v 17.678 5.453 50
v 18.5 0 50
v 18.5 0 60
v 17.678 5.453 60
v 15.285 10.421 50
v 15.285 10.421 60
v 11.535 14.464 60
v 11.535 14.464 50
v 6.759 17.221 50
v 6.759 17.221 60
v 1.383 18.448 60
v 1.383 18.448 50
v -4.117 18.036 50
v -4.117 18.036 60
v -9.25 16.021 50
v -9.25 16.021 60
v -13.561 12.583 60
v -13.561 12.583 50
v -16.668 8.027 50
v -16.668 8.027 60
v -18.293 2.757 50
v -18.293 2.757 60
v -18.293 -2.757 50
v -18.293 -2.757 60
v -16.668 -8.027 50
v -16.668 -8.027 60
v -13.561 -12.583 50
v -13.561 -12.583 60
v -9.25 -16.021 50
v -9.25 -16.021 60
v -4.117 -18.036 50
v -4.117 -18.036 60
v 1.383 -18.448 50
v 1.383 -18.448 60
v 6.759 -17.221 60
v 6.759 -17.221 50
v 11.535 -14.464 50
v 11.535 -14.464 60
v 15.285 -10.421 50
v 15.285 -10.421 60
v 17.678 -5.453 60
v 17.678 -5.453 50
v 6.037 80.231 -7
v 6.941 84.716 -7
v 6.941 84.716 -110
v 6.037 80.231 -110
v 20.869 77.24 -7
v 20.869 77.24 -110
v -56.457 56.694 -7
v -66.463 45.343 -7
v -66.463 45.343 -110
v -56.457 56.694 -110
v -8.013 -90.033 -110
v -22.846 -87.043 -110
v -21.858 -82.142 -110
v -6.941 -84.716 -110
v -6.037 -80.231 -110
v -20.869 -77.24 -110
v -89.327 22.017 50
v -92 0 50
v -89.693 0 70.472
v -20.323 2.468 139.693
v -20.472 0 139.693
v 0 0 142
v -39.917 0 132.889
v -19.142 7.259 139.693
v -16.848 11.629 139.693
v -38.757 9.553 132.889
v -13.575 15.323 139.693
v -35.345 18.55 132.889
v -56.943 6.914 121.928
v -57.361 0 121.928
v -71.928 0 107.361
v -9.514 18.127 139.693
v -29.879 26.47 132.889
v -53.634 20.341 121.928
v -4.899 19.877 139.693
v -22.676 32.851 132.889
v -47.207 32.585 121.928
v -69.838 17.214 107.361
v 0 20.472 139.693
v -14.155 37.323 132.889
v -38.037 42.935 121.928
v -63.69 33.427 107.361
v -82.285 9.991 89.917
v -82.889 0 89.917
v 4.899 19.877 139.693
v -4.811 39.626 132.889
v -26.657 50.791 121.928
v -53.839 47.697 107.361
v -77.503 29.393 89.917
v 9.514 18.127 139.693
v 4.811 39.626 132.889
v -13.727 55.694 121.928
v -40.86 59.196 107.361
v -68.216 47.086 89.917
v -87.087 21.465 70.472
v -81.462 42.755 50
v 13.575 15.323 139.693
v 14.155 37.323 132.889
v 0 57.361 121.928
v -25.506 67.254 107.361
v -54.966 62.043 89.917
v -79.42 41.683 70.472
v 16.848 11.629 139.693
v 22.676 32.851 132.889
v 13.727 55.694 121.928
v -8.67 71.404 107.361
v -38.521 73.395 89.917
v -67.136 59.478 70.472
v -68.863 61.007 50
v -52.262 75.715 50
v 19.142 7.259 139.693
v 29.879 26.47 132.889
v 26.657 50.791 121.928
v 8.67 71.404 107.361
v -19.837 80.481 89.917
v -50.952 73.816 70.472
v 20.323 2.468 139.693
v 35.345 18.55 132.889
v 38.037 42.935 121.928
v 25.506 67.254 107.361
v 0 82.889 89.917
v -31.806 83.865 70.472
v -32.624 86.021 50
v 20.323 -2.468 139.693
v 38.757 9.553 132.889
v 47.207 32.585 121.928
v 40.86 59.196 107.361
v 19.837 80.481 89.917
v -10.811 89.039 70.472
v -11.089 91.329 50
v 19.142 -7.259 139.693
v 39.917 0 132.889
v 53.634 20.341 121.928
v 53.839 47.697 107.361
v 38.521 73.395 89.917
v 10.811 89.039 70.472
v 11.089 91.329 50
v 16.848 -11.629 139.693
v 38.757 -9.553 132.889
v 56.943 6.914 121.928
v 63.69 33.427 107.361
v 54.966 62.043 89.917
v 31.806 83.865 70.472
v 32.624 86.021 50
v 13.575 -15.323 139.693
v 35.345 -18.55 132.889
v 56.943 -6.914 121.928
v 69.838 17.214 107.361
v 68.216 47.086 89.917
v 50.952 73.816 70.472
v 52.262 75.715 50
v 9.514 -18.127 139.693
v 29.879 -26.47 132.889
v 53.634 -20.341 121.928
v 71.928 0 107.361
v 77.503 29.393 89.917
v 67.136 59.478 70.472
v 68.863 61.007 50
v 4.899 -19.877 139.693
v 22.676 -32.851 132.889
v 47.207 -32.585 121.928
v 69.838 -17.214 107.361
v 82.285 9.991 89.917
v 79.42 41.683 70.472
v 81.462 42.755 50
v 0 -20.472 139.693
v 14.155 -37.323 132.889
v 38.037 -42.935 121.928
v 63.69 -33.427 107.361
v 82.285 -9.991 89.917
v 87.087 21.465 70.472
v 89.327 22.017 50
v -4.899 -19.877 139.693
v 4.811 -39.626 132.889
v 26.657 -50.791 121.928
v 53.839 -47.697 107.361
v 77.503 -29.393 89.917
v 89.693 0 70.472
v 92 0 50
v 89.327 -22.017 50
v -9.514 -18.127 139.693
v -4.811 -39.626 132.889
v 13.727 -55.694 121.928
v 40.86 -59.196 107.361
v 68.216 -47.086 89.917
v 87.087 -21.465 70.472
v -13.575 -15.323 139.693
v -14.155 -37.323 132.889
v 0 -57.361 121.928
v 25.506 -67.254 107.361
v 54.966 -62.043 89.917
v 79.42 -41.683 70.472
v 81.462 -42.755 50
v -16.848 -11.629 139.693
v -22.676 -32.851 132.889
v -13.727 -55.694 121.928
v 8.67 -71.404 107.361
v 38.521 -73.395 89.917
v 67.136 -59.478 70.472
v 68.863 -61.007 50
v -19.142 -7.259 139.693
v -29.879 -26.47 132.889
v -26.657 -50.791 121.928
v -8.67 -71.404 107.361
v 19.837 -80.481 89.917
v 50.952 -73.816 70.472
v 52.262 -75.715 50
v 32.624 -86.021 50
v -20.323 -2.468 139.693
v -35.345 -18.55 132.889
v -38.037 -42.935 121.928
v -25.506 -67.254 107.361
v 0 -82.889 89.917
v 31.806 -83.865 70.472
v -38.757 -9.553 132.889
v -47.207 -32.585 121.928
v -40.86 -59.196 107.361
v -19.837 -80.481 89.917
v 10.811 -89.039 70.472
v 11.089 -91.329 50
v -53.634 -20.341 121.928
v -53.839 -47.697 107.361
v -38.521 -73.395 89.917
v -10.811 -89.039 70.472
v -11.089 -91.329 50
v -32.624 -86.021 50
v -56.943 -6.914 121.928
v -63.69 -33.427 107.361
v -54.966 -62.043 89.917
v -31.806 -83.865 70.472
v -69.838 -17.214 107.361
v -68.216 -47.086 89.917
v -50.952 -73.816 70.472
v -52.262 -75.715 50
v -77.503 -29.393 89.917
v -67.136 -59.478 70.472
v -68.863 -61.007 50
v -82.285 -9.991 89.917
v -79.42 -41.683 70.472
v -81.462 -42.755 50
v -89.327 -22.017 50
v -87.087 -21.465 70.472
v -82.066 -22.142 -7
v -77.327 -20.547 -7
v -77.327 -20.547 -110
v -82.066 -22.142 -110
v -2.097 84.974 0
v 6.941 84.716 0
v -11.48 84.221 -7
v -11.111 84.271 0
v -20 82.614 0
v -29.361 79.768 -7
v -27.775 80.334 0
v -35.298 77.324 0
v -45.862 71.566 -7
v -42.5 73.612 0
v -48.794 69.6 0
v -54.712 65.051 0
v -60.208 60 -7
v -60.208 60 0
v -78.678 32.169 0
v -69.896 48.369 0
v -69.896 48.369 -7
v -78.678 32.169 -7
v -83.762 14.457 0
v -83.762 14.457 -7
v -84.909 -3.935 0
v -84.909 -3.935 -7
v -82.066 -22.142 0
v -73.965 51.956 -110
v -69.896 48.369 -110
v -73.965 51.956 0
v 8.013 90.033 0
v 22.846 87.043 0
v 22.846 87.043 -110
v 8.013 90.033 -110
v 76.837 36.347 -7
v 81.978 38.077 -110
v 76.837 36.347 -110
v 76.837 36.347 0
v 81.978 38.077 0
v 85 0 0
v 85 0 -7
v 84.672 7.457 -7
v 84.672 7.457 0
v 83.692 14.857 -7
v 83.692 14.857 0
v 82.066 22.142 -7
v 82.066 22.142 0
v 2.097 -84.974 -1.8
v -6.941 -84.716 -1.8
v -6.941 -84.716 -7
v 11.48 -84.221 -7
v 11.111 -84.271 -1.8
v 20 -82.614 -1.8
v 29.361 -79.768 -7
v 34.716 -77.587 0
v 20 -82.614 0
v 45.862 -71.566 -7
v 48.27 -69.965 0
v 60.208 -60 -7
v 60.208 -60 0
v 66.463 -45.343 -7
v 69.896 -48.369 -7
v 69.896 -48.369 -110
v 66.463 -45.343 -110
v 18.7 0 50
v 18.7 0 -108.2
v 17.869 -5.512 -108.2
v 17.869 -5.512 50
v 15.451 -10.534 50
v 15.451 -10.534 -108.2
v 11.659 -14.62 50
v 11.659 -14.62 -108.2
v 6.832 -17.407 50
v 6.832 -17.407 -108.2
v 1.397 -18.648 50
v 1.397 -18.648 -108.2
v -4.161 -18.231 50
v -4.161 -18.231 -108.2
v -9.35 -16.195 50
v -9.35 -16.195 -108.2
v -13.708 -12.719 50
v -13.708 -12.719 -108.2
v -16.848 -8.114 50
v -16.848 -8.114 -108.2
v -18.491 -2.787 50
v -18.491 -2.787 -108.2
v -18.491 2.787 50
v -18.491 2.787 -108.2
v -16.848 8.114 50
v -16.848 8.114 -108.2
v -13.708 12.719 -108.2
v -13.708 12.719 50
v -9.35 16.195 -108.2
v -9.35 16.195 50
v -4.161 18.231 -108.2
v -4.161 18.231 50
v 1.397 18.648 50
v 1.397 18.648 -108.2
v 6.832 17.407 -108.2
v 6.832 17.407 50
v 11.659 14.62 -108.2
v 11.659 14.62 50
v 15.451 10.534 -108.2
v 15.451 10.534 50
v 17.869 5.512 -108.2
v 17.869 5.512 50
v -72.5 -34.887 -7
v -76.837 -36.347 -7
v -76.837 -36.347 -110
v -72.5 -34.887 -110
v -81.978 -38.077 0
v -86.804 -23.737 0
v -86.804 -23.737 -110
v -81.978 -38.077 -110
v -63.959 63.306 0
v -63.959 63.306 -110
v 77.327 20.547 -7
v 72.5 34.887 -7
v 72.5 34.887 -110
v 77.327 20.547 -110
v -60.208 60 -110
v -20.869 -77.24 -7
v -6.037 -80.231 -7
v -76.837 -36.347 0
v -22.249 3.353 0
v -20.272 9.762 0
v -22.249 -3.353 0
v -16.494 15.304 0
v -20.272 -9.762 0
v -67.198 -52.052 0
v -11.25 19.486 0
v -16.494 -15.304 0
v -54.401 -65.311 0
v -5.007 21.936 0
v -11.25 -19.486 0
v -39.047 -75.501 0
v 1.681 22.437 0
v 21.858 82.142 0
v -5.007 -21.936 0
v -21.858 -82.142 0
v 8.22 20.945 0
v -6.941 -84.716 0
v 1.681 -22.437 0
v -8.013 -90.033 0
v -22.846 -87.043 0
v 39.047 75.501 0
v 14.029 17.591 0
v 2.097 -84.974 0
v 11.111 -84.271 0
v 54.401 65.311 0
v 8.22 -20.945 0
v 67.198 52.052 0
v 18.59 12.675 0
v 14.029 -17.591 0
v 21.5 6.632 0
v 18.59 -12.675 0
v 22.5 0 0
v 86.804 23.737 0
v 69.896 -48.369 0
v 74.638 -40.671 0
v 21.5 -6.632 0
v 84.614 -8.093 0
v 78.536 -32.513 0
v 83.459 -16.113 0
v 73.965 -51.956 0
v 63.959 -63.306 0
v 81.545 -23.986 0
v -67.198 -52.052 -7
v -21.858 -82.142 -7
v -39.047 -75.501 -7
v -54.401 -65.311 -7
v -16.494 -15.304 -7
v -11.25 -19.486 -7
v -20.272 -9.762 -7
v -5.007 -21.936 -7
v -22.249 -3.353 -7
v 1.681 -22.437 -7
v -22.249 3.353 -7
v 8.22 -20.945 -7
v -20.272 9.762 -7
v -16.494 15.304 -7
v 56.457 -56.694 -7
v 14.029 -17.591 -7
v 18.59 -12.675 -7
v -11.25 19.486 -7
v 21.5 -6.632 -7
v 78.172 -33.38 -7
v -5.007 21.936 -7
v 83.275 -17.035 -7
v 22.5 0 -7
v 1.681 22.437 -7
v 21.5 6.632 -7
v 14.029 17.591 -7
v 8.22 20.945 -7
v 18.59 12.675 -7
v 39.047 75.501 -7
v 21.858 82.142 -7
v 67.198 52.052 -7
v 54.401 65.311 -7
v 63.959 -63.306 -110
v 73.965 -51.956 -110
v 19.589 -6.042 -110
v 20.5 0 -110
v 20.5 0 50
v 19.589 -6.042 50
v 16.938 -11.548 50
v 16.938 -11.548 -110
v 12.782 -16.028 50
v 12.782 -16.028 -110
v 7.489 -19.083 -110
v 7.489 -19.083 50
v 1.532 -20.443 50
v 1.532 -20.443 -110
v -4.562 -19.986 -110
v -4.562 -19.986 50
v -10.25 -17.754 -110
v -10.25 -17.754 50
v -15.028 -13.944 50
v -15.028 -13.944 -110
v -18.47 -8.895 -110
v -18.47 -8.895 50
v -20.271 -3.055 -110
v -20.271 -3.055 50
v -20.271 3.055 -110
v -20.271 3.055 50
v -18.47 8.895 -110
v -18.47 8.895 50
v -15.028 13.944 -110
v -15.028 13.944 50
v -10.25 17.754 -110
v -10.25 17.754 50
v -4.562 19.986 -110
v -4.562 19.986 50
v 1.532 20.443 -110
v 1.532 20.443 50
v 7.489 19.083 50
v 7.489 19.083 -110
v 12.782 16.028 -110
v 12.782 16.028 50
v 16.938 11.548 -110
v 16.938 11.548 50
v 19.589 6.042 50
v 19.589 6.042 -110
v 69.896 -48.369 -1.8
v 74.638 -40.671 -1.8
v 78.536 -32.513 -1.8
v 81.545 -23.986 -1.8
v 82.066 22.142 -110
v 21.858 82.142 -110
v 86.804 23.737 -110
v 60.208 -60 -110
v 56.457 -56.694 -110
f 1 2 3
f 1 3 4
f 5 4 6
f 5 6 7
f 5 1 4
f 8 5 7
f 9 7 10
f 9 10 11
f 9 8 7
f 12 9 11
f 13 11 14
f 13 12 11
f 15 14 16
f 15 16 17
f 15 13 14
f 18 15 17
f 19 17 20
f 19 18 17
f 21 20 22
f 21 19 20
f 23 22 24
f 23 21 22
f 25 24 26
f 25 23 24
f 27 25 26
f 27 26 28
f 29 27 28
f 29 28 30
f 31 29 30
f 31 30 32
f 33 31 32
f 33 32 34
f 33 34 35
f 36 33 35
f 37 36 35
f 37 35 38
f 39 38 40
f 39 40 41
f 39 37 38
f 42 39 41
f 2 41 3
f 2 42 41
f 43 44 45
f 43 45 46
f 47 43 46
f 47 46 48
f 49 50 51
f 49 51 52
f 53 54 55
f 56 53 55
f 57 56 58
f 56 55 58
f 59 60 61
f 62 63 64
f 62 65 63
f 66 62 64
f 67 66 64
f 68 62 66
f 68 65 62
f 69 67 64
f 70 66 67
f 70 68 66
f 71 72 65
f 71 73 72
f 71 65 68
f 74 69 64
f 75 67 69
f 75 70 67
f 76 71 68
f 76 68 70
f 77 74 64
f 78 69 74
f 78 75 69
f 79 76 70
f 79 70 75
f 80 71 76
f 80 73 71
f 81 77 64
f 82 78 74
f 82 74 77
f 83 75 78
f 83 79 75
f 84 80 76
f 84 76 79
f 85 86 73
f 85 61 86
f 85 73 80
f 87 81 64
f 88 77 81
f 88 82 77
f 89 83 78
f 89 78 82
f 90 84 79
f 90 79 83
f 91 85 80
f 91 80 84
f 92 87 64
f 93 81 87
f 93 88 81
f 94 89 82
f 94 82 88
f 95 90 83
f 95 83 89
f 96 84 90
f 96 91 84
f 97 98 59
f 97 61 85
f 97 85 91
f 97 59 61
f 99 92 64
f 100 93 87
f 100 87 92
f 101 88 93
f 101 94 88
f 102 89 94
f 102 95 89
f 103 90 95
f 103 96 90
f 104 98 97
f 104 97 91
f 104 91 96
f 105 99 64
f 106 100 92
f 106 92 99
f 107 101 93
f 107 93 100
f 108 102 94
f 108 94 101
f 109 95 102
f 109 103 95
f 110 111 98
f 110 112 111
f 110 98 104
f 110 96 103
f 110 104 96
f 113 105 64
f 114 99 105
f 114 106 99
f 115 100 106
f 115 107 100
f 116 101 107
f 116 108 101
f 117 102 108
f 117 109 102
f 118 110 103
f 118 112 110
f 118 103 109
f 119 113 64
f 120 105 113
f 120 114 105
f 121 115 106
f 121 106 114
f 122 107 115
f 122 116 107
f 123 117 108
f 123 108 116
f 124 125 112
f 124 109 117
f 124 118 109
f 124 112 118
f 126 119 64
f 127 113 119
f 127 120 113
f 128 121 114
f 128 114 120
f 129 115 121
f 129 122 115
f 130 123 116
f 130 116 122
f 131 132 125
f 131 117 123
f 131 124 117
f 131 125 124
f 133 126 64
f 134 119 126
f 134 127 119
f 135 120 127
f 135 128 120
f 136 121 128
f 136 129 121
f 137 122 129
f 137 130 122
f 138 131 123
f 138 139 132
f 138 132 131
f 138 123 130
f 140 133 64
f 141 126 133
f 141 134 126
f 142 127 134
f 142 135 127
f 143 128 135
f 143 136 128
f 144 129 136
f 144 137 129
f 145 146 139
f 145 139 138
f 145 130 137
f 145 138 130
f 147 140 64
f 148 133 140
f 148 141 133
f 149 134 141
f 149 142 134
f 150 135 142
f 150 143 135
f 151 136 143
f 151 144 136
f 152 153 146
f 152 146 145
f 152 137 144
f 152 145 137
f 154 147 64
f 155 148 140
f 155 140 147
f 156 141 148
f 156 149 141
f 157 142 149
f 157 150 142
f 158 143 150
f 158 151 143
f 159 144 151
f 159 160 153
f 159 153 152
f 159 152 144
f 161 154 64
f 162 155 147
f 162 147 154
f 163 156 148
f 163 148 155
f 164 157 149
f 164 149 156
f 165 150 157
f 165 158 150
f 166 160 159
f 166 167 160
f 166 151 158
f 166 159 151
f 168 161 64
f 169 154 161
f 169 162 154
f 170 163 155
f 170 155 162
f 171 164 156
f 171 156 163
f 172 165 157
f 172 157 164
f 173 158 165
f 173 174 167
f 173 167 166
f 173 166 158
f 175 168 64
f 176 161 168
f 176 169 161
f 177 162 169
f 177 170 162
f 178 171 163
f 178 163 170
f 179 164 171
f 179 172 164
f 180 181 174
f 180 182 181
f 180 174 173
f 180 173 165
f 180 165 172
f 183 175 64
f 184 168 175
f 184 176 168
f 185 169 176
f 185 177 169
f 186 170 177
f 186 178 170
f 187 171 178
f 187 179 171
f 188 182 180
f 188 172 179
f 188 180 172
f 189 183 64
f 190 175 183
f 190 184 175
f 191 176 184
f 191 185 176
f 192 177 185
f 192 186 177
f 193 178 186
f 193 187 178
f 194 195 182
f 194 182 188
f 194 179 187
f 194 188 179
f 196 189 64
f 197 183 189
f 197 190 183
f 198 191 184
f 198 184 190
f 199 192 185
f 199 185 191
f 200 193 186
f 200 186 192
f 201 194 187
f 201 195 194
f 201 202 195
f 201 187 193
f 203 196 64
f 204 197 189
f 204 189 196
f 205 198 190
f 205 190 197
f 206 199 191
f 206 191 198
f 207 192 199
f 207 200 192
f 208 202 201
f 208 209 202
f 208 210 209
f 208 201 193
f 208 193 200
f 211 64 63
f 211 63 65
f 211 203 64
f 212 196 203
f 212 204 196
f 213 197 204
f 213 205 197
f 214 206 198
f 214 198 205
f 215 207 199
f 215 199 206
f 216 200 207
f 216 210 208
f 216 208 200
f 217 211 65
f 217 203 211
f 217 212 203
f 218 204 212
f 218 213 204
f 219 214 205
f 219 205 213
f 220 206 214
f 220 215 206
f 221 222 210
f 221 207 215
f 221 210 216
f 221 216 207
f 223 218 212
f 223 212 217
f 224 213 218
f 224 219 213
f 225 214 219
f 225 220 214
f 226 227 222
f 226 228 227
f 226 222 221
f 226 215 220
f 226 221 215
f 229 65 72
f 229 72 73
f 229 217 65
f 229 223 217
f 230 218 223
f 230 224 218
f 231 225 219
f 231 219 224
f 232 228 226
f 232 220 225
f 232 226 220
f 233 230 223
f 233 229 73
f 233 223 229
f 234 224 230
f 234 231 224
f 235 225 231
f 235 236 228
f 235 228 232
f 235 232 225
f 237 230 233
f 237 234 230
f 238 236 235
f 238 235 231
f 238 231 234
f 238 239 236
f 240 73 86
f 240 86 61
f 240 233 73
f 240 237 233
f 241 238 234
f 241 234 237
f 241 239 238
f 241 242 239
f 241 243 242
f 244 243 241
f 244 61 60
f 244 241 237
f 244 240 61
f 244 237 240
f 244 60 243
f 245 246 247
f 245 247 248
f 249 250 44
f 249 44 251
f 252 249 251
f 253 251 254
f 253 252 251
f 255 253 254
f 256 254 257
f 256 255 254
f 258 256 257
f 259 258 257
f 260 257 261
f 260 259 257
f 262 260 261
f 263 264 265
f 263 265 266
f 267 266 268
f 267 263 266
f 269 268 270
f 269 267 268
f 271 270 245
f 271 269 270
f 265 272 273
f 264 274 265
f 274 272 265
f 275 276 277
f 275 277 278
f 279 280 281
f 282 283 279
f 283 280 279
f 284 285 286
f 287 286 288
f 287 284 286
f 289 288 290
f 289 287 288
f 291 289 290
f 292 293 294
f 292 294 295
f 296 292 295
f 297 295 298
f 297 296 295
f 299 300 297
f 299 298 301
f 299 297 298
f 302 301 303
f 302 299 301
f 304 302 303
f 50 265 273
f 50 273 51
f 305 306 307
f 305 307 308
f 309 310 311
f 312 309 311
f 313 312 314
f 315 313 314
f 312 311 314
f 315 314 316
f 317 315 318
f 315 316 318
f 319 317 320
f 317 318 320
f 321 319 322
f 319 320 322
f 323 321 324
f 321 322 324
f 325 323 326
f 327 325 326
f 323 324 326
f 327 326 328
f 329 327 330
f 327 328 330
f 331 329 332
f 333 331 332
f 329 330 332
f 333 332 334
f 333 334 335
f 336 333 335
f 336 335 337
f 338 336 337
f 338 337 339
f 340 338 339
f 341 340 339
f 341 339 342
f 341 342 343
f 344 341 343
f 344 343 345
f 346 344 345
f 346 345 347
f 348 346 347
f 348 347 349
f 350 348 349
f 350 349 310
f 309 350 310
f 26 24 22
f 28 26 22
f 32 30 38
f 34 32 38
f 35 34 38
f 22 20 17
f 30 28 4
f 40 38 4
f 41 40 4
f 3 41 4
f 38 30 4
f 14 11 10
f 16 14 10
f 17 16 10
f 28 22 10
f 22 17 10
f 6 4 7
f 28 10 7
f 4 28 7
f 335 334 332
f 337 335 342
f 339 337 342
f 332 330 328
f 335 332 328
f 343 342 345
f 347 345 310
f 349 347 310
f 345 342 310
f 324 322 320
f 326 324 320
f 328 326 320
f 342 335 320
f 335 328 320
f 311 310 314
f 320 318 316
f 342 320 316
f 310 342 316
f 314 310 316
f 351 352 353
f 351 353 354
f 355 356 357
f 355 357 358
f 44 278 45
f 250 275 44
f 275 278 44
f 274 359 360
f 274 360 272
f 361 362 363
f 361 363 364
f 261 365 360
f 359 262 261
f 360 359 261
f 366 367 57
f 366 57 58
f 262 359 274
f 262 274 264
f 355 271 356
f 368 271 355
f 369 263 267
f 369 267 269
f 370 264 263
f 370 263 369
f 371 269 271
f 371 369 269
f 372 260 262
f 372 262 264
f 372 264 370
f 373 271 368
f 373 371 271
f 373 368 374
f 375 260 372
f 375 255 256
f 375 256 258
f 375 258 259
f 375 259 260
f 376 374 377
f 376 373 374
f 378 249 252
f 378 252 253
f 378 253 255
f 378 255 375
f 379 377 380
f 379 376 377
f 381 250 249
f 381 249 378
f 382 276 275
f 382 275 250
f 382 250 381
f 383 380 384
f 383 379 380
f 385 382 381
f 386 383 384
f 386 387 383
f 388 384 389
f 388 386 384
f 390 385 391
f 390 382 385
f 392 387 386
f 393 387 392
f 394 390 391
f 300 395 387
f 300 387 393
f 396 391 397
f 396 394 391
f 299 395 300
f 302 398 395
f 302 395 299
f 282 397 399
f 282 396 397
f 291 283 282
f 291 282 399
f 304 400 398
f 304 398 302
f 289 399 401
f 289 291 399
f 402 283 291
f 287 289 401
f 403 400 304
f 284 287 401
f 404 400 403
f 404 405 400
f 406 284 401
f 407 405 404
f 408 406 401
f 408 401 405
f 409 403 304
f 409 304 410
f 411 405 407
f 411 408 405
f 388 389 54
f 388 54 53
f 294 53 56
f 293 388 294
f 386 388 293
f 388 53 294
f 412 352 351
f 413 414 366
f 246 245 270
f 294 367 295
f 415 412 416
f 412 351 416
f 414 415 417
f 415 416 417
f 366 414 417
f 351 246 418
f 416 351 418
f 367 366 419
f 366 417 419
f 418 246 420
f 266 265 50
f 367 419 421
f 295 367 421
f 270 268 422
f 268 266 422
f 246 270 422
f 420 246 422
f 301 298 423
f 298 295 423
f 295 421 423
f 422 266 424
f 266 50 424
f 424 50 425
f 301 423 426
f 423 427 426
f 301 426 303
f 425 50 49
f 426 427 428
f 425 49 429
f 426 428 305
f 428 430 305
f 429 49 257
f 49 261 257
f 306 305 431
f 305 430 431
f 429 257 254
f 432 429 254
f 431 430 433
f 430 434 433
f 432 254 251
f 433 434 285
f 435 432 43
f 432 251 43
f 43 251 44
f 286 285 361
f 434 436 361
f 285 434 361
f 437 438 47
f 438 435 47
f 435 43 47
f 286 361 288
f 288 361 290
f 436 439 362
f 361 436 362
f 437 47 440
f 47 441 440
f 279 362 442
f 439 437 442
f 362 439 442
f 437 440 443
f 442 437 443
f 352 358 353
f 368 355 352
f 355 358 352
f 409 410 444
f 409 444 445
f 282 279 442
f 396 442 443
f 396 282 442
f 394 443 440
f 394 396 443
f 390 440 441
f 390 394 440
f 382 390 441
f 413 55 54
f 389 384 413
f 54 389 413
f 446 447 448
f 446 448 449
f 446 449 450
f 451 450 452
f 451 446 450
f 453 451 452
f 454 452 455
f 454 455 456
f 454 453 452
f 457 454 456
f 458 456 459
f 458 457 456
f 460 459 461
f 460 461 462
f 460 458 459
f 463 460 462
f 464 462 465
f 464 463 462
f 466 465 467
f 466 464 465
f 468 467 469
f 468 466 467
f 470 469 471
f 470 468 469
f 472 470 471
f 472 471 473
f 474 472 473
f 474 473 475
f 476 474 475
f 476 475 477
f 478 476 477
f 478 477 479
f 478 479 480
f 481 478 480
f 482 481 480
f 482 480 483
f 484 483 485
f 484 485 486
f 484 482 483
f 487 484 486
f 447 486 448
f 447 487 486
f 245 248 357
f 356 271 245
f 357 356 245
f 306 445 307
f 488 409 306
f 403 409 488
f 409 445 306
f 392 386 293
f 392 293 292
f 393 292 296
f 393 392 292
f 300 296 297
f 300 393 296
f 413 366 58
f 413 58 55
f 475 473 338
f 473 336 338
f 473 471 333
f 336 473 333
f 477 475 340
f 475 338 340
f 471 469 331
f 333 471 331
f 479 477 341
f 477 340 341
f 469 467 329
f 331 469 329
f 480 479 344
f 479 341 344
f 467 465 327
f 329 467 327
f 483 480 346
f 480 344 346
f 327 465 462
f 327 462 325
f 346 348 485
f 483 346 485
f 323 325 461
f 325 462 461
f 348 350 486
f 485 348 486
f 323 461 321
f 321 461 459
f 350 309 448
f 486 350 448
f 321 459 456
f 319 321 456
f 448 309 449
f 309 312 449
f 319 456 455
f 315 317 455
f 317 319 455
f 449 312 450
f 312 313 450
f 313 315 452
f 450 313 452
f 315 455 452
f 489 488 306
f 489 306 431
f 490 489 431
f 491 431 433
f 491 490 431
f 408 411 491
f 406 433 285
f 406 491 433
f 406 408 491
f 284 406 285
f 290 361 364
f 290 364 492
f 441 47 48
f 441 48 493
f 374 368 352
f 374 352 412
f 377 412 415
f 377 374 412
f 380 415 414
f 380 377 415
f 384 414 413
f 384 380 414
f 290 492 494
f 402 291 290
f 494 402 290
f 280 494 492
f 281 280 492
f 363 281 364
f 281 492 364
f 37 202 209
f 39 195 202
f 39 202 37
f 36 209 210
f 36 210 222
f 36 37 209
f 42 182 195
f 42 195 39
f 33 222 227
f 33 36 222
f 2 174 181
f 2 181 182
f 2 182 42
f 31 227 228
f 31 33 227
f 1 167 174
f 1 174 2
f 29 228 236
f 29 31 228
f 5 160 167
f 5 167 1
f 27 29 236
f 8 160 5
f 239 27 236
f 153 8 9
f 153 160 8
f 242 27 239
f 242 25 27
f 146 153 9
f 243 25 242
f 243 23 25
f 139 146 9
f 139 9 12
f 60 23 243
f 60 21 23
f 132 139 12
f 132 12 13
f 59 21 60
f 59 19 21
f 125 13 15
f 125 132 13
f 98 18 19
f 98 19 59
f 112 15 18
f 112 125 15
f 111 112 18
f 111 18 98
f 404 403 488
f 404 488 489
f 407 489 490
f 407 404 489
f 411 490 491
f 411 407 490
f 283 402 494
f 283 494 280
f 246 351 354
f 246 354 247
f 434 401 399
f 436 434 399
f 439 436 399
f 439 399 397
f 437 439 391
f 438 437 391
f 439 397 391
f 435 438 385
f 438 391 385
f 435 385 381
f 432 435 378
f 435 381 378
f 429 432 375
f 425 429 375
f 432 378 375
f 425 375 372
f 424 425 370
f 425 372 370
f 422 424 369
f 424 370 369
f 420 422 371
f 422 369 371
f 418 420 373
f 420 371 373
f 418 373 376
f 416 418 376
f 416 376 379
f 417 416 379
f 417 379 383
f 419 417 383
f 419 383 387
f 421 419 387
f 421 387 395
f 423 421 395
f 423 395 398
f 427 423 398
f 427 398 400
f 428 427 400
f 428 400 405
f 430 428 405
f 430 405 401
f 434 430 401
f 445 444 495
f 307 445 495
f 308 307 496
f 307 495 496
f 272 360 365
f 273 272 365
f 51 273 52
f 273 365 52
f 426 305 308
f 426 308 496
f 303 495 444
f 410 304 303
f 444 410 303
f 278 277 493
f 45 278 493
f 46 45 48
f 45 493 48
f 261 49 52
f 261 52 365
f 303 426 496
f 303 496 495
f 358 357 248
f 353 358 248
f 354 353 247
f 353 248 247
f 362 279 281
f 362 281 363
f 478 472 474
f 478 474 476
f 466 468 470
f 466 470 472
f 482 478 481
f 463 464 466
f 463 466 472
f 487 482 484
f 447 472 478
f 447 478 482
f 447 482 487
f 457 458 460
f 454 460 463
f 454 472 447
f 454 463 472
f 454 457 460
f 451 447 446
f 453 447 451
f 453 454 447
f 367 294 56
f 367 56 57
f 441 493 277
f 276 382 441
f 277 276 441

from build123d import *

# Parameters (mm, degrees)
F1_R      = 85
F2_DEPTH  = 7
F3_DEPTH  = 1.8
F5_DEPTH  = 110
F7_COUNT  = 6
F9_R      = 22.5
F10_DEPTH = 25
F11_R     = 20.5
F12_DEPTH = 160
F16_R     = 18.5
F17_DEPTH = 10
F18_T     = -1.8


with BuildPart() as f2:
    # F1 (on Top) → F2 (new body)
    with BuildSketch(Plane.XY):
        Circle(F1_R)
    extrude(amount=-F2_DEPTH)



with BuildPart() as f3:
    # F0 (on Top) → F3 (new body)
    with BuildSketch(Plane.XY):
        with BuildLine():
            Line((-20, 61.8465843843), (-20, 82.6135582093))
            ThreePointArc((-20, 82.6135582093), (-85, 0), (-20, -82.6135582093))
            Line((-20, -82.6135582093), (-20, -61.8465843843))
            ThreePointArc((-20, -61.8465843843), (-65, 0), (-20, 61.8465843843))
        make_face()
        with BuildLine():
            Line((20, 61.8465843843), (20, 82.6135582093))
            ThreePointArc((20, 82.6135582093), (0, 85), (-20, 82.6135582093))
            Line((-20, 82.6135582093), (-20, 61.8465843843))
            ThreePointArc((-20, 61.8465843843), (0, 65), (20, 61.8465843843))
        make_face()
        with BuildLine():
            ThreePointArc((20, -82.6135582093), (66.8019460794, -52.5594901041), (85, 0))
            ThreePointArc((85, 0), (66.8019460794, 52.5594901041), (20, 82.6135582093))
            Line((20, 82.6135582093), (20, 61.8465843843))
            ThreePointArc((20, 61.8465843843), (52.5594901041, 38.2426463519), (65, 0))
            ThreePointArc((65, 0), (52.5594901041, -38.2426463519), (20, -61.8465843843))
            Line((20, -61.8465843843), (20, -82.6135582093))
        make_face()
        with BuildLine():
            ThreePointArc((-20, -82.6135582093), (0, -85), (20, -82.6135582093))
            Line((20, -82.6135582093), (20, -61.8465843843))
            ThreePointArc((20, -61.8465843843), (0, -65), (-20, -61.8465843843))
            Line((-20, -61.8465843843), (-20, -82.6135582093))
        make_face()
        with BuildLine():
            ThreePointArc((65, 0), (52.5594901041, 38.2426463519), (20, 61.8465843843))
            Line((20, 61.8465843843), (20, -61.8465843843))
            ThreePointArc((20, -61.8465843843), (52.5594901041, -38.2426463519), (65, 0))
        make_face()
        with BuildLine():
            Line((-20, -61.8465843843), (-20, 61.8465843843))
            ThreePointArc((-20, 61.8465843843), (-65, 0), (-20, -61.8465843843))
        make_face()
        with BuildLine():
            Line((20, -61.8465843843), (20, 61.8465843843))
            ThreePointArc((20, 61.8465843843), (0, 65), (-20, 61.8465843843))
            Line((-20, 61.8465843843), (-20, -61.8465843843))
            ThreePointArc((-20, -61.8465843843), (0, -65), (20, -61.8465843843))
        make_face()
    extrude(amount=-F3_DEPTH)


with BuildPart() as f2_1:
    add(f2.part)

    add(f3.part)  # F5 merges F3
    # F4 (on face) → F5 (join)
    with BuildSketch(Plane.XY):
        with BuildLine():
            ThreePointArc((-69.8957458622, 48.369253771), (-65.3112775331, 54.4007079641), (-60.207972894, 60))
            Line((-60.207972894, 60), (-63.9586006318, 63.3064772148))
            Line((-63.9586006318, 63.3064772148), (-73.9646619792, 51.9563275544))
            Line((-73.9646619792, 51.9563275544), (-69.8957458622, 48.369253771))
        make_face()
        with BuildLine():
            Line((-56.4573451561, 56.6935227852), (-60.207972894, 60))
            ThreePointArc((-60.207972894, 60), (-65.3112775331, 54.4007079641), (-69.8957458622, 48.369253771))
            Line((-69.8957458622, 48.369253771), (-66.4634065035, 45.3433731249))
            Line((-66.4634065035, 45.3433731249), (-56.4573451561, 56.6935227852))
        make_face()
    extrude(amount=-F5_DEPTH)

    # F7: F2 ×6 about axis
    f7_axis = Axis((0, 0, 31.9716259837), (0, 0, 1))


with BuildPart() as f2_2:
    add(f2_1.part)
    for i in range(1, F7_COUNT):
        add(f2_1.part.rotate(f7_axis, i * 360 / F7_COUNT))

    # F9 (on face) → F10 (cut)
    with BuildSketch(Plane.XY):
        Circle(F9_R)
    extrude(amount=-F10_DEPTH, mode=Mode.SUBTRACT)


with BuildPart() as f12:
    # F11 (on face) → F12 (new body)
    with BuildSketch(Plane(origin=(0, 0, -110), x_dir=(1, 0, 0), z_dir=(0, 0, -1))):
        Circle(F11_R)
    extrude(amount=-F12_DEPTH)

    # F18
    f18_openings = [f12.faces().sort_by_distance(p)[0] for p in [
        (0, 0, 50),
    ]]
    offset(amount=F18_T, openings=f18_openings)


with BuildPart() as f15:
    # F14 (on Front) → F15 (revolve)
    with BuildSketch(Plane.XZ):
        with BuildLine():
            Line((-92, 50), (0, 50))
            Line((0, 50), (0, 142))
            ThreePointArc((0, 142), (-65.0538238692, 115.0538238692), (-92, 50))
        make_face()
    revolve(axis=Axis((0, 0, 96), (0, 0, -1)))

    # F16 (on face) → F17 (cut)
    with BuildSketch(Plane.XY.offset(50)):
        Circle(F16_R)
    extrude(amount=F17_DEPTH, mode=Mode.SUBTRACT)


solid = Compound([f2_2.part, f12.part, f15.part])
